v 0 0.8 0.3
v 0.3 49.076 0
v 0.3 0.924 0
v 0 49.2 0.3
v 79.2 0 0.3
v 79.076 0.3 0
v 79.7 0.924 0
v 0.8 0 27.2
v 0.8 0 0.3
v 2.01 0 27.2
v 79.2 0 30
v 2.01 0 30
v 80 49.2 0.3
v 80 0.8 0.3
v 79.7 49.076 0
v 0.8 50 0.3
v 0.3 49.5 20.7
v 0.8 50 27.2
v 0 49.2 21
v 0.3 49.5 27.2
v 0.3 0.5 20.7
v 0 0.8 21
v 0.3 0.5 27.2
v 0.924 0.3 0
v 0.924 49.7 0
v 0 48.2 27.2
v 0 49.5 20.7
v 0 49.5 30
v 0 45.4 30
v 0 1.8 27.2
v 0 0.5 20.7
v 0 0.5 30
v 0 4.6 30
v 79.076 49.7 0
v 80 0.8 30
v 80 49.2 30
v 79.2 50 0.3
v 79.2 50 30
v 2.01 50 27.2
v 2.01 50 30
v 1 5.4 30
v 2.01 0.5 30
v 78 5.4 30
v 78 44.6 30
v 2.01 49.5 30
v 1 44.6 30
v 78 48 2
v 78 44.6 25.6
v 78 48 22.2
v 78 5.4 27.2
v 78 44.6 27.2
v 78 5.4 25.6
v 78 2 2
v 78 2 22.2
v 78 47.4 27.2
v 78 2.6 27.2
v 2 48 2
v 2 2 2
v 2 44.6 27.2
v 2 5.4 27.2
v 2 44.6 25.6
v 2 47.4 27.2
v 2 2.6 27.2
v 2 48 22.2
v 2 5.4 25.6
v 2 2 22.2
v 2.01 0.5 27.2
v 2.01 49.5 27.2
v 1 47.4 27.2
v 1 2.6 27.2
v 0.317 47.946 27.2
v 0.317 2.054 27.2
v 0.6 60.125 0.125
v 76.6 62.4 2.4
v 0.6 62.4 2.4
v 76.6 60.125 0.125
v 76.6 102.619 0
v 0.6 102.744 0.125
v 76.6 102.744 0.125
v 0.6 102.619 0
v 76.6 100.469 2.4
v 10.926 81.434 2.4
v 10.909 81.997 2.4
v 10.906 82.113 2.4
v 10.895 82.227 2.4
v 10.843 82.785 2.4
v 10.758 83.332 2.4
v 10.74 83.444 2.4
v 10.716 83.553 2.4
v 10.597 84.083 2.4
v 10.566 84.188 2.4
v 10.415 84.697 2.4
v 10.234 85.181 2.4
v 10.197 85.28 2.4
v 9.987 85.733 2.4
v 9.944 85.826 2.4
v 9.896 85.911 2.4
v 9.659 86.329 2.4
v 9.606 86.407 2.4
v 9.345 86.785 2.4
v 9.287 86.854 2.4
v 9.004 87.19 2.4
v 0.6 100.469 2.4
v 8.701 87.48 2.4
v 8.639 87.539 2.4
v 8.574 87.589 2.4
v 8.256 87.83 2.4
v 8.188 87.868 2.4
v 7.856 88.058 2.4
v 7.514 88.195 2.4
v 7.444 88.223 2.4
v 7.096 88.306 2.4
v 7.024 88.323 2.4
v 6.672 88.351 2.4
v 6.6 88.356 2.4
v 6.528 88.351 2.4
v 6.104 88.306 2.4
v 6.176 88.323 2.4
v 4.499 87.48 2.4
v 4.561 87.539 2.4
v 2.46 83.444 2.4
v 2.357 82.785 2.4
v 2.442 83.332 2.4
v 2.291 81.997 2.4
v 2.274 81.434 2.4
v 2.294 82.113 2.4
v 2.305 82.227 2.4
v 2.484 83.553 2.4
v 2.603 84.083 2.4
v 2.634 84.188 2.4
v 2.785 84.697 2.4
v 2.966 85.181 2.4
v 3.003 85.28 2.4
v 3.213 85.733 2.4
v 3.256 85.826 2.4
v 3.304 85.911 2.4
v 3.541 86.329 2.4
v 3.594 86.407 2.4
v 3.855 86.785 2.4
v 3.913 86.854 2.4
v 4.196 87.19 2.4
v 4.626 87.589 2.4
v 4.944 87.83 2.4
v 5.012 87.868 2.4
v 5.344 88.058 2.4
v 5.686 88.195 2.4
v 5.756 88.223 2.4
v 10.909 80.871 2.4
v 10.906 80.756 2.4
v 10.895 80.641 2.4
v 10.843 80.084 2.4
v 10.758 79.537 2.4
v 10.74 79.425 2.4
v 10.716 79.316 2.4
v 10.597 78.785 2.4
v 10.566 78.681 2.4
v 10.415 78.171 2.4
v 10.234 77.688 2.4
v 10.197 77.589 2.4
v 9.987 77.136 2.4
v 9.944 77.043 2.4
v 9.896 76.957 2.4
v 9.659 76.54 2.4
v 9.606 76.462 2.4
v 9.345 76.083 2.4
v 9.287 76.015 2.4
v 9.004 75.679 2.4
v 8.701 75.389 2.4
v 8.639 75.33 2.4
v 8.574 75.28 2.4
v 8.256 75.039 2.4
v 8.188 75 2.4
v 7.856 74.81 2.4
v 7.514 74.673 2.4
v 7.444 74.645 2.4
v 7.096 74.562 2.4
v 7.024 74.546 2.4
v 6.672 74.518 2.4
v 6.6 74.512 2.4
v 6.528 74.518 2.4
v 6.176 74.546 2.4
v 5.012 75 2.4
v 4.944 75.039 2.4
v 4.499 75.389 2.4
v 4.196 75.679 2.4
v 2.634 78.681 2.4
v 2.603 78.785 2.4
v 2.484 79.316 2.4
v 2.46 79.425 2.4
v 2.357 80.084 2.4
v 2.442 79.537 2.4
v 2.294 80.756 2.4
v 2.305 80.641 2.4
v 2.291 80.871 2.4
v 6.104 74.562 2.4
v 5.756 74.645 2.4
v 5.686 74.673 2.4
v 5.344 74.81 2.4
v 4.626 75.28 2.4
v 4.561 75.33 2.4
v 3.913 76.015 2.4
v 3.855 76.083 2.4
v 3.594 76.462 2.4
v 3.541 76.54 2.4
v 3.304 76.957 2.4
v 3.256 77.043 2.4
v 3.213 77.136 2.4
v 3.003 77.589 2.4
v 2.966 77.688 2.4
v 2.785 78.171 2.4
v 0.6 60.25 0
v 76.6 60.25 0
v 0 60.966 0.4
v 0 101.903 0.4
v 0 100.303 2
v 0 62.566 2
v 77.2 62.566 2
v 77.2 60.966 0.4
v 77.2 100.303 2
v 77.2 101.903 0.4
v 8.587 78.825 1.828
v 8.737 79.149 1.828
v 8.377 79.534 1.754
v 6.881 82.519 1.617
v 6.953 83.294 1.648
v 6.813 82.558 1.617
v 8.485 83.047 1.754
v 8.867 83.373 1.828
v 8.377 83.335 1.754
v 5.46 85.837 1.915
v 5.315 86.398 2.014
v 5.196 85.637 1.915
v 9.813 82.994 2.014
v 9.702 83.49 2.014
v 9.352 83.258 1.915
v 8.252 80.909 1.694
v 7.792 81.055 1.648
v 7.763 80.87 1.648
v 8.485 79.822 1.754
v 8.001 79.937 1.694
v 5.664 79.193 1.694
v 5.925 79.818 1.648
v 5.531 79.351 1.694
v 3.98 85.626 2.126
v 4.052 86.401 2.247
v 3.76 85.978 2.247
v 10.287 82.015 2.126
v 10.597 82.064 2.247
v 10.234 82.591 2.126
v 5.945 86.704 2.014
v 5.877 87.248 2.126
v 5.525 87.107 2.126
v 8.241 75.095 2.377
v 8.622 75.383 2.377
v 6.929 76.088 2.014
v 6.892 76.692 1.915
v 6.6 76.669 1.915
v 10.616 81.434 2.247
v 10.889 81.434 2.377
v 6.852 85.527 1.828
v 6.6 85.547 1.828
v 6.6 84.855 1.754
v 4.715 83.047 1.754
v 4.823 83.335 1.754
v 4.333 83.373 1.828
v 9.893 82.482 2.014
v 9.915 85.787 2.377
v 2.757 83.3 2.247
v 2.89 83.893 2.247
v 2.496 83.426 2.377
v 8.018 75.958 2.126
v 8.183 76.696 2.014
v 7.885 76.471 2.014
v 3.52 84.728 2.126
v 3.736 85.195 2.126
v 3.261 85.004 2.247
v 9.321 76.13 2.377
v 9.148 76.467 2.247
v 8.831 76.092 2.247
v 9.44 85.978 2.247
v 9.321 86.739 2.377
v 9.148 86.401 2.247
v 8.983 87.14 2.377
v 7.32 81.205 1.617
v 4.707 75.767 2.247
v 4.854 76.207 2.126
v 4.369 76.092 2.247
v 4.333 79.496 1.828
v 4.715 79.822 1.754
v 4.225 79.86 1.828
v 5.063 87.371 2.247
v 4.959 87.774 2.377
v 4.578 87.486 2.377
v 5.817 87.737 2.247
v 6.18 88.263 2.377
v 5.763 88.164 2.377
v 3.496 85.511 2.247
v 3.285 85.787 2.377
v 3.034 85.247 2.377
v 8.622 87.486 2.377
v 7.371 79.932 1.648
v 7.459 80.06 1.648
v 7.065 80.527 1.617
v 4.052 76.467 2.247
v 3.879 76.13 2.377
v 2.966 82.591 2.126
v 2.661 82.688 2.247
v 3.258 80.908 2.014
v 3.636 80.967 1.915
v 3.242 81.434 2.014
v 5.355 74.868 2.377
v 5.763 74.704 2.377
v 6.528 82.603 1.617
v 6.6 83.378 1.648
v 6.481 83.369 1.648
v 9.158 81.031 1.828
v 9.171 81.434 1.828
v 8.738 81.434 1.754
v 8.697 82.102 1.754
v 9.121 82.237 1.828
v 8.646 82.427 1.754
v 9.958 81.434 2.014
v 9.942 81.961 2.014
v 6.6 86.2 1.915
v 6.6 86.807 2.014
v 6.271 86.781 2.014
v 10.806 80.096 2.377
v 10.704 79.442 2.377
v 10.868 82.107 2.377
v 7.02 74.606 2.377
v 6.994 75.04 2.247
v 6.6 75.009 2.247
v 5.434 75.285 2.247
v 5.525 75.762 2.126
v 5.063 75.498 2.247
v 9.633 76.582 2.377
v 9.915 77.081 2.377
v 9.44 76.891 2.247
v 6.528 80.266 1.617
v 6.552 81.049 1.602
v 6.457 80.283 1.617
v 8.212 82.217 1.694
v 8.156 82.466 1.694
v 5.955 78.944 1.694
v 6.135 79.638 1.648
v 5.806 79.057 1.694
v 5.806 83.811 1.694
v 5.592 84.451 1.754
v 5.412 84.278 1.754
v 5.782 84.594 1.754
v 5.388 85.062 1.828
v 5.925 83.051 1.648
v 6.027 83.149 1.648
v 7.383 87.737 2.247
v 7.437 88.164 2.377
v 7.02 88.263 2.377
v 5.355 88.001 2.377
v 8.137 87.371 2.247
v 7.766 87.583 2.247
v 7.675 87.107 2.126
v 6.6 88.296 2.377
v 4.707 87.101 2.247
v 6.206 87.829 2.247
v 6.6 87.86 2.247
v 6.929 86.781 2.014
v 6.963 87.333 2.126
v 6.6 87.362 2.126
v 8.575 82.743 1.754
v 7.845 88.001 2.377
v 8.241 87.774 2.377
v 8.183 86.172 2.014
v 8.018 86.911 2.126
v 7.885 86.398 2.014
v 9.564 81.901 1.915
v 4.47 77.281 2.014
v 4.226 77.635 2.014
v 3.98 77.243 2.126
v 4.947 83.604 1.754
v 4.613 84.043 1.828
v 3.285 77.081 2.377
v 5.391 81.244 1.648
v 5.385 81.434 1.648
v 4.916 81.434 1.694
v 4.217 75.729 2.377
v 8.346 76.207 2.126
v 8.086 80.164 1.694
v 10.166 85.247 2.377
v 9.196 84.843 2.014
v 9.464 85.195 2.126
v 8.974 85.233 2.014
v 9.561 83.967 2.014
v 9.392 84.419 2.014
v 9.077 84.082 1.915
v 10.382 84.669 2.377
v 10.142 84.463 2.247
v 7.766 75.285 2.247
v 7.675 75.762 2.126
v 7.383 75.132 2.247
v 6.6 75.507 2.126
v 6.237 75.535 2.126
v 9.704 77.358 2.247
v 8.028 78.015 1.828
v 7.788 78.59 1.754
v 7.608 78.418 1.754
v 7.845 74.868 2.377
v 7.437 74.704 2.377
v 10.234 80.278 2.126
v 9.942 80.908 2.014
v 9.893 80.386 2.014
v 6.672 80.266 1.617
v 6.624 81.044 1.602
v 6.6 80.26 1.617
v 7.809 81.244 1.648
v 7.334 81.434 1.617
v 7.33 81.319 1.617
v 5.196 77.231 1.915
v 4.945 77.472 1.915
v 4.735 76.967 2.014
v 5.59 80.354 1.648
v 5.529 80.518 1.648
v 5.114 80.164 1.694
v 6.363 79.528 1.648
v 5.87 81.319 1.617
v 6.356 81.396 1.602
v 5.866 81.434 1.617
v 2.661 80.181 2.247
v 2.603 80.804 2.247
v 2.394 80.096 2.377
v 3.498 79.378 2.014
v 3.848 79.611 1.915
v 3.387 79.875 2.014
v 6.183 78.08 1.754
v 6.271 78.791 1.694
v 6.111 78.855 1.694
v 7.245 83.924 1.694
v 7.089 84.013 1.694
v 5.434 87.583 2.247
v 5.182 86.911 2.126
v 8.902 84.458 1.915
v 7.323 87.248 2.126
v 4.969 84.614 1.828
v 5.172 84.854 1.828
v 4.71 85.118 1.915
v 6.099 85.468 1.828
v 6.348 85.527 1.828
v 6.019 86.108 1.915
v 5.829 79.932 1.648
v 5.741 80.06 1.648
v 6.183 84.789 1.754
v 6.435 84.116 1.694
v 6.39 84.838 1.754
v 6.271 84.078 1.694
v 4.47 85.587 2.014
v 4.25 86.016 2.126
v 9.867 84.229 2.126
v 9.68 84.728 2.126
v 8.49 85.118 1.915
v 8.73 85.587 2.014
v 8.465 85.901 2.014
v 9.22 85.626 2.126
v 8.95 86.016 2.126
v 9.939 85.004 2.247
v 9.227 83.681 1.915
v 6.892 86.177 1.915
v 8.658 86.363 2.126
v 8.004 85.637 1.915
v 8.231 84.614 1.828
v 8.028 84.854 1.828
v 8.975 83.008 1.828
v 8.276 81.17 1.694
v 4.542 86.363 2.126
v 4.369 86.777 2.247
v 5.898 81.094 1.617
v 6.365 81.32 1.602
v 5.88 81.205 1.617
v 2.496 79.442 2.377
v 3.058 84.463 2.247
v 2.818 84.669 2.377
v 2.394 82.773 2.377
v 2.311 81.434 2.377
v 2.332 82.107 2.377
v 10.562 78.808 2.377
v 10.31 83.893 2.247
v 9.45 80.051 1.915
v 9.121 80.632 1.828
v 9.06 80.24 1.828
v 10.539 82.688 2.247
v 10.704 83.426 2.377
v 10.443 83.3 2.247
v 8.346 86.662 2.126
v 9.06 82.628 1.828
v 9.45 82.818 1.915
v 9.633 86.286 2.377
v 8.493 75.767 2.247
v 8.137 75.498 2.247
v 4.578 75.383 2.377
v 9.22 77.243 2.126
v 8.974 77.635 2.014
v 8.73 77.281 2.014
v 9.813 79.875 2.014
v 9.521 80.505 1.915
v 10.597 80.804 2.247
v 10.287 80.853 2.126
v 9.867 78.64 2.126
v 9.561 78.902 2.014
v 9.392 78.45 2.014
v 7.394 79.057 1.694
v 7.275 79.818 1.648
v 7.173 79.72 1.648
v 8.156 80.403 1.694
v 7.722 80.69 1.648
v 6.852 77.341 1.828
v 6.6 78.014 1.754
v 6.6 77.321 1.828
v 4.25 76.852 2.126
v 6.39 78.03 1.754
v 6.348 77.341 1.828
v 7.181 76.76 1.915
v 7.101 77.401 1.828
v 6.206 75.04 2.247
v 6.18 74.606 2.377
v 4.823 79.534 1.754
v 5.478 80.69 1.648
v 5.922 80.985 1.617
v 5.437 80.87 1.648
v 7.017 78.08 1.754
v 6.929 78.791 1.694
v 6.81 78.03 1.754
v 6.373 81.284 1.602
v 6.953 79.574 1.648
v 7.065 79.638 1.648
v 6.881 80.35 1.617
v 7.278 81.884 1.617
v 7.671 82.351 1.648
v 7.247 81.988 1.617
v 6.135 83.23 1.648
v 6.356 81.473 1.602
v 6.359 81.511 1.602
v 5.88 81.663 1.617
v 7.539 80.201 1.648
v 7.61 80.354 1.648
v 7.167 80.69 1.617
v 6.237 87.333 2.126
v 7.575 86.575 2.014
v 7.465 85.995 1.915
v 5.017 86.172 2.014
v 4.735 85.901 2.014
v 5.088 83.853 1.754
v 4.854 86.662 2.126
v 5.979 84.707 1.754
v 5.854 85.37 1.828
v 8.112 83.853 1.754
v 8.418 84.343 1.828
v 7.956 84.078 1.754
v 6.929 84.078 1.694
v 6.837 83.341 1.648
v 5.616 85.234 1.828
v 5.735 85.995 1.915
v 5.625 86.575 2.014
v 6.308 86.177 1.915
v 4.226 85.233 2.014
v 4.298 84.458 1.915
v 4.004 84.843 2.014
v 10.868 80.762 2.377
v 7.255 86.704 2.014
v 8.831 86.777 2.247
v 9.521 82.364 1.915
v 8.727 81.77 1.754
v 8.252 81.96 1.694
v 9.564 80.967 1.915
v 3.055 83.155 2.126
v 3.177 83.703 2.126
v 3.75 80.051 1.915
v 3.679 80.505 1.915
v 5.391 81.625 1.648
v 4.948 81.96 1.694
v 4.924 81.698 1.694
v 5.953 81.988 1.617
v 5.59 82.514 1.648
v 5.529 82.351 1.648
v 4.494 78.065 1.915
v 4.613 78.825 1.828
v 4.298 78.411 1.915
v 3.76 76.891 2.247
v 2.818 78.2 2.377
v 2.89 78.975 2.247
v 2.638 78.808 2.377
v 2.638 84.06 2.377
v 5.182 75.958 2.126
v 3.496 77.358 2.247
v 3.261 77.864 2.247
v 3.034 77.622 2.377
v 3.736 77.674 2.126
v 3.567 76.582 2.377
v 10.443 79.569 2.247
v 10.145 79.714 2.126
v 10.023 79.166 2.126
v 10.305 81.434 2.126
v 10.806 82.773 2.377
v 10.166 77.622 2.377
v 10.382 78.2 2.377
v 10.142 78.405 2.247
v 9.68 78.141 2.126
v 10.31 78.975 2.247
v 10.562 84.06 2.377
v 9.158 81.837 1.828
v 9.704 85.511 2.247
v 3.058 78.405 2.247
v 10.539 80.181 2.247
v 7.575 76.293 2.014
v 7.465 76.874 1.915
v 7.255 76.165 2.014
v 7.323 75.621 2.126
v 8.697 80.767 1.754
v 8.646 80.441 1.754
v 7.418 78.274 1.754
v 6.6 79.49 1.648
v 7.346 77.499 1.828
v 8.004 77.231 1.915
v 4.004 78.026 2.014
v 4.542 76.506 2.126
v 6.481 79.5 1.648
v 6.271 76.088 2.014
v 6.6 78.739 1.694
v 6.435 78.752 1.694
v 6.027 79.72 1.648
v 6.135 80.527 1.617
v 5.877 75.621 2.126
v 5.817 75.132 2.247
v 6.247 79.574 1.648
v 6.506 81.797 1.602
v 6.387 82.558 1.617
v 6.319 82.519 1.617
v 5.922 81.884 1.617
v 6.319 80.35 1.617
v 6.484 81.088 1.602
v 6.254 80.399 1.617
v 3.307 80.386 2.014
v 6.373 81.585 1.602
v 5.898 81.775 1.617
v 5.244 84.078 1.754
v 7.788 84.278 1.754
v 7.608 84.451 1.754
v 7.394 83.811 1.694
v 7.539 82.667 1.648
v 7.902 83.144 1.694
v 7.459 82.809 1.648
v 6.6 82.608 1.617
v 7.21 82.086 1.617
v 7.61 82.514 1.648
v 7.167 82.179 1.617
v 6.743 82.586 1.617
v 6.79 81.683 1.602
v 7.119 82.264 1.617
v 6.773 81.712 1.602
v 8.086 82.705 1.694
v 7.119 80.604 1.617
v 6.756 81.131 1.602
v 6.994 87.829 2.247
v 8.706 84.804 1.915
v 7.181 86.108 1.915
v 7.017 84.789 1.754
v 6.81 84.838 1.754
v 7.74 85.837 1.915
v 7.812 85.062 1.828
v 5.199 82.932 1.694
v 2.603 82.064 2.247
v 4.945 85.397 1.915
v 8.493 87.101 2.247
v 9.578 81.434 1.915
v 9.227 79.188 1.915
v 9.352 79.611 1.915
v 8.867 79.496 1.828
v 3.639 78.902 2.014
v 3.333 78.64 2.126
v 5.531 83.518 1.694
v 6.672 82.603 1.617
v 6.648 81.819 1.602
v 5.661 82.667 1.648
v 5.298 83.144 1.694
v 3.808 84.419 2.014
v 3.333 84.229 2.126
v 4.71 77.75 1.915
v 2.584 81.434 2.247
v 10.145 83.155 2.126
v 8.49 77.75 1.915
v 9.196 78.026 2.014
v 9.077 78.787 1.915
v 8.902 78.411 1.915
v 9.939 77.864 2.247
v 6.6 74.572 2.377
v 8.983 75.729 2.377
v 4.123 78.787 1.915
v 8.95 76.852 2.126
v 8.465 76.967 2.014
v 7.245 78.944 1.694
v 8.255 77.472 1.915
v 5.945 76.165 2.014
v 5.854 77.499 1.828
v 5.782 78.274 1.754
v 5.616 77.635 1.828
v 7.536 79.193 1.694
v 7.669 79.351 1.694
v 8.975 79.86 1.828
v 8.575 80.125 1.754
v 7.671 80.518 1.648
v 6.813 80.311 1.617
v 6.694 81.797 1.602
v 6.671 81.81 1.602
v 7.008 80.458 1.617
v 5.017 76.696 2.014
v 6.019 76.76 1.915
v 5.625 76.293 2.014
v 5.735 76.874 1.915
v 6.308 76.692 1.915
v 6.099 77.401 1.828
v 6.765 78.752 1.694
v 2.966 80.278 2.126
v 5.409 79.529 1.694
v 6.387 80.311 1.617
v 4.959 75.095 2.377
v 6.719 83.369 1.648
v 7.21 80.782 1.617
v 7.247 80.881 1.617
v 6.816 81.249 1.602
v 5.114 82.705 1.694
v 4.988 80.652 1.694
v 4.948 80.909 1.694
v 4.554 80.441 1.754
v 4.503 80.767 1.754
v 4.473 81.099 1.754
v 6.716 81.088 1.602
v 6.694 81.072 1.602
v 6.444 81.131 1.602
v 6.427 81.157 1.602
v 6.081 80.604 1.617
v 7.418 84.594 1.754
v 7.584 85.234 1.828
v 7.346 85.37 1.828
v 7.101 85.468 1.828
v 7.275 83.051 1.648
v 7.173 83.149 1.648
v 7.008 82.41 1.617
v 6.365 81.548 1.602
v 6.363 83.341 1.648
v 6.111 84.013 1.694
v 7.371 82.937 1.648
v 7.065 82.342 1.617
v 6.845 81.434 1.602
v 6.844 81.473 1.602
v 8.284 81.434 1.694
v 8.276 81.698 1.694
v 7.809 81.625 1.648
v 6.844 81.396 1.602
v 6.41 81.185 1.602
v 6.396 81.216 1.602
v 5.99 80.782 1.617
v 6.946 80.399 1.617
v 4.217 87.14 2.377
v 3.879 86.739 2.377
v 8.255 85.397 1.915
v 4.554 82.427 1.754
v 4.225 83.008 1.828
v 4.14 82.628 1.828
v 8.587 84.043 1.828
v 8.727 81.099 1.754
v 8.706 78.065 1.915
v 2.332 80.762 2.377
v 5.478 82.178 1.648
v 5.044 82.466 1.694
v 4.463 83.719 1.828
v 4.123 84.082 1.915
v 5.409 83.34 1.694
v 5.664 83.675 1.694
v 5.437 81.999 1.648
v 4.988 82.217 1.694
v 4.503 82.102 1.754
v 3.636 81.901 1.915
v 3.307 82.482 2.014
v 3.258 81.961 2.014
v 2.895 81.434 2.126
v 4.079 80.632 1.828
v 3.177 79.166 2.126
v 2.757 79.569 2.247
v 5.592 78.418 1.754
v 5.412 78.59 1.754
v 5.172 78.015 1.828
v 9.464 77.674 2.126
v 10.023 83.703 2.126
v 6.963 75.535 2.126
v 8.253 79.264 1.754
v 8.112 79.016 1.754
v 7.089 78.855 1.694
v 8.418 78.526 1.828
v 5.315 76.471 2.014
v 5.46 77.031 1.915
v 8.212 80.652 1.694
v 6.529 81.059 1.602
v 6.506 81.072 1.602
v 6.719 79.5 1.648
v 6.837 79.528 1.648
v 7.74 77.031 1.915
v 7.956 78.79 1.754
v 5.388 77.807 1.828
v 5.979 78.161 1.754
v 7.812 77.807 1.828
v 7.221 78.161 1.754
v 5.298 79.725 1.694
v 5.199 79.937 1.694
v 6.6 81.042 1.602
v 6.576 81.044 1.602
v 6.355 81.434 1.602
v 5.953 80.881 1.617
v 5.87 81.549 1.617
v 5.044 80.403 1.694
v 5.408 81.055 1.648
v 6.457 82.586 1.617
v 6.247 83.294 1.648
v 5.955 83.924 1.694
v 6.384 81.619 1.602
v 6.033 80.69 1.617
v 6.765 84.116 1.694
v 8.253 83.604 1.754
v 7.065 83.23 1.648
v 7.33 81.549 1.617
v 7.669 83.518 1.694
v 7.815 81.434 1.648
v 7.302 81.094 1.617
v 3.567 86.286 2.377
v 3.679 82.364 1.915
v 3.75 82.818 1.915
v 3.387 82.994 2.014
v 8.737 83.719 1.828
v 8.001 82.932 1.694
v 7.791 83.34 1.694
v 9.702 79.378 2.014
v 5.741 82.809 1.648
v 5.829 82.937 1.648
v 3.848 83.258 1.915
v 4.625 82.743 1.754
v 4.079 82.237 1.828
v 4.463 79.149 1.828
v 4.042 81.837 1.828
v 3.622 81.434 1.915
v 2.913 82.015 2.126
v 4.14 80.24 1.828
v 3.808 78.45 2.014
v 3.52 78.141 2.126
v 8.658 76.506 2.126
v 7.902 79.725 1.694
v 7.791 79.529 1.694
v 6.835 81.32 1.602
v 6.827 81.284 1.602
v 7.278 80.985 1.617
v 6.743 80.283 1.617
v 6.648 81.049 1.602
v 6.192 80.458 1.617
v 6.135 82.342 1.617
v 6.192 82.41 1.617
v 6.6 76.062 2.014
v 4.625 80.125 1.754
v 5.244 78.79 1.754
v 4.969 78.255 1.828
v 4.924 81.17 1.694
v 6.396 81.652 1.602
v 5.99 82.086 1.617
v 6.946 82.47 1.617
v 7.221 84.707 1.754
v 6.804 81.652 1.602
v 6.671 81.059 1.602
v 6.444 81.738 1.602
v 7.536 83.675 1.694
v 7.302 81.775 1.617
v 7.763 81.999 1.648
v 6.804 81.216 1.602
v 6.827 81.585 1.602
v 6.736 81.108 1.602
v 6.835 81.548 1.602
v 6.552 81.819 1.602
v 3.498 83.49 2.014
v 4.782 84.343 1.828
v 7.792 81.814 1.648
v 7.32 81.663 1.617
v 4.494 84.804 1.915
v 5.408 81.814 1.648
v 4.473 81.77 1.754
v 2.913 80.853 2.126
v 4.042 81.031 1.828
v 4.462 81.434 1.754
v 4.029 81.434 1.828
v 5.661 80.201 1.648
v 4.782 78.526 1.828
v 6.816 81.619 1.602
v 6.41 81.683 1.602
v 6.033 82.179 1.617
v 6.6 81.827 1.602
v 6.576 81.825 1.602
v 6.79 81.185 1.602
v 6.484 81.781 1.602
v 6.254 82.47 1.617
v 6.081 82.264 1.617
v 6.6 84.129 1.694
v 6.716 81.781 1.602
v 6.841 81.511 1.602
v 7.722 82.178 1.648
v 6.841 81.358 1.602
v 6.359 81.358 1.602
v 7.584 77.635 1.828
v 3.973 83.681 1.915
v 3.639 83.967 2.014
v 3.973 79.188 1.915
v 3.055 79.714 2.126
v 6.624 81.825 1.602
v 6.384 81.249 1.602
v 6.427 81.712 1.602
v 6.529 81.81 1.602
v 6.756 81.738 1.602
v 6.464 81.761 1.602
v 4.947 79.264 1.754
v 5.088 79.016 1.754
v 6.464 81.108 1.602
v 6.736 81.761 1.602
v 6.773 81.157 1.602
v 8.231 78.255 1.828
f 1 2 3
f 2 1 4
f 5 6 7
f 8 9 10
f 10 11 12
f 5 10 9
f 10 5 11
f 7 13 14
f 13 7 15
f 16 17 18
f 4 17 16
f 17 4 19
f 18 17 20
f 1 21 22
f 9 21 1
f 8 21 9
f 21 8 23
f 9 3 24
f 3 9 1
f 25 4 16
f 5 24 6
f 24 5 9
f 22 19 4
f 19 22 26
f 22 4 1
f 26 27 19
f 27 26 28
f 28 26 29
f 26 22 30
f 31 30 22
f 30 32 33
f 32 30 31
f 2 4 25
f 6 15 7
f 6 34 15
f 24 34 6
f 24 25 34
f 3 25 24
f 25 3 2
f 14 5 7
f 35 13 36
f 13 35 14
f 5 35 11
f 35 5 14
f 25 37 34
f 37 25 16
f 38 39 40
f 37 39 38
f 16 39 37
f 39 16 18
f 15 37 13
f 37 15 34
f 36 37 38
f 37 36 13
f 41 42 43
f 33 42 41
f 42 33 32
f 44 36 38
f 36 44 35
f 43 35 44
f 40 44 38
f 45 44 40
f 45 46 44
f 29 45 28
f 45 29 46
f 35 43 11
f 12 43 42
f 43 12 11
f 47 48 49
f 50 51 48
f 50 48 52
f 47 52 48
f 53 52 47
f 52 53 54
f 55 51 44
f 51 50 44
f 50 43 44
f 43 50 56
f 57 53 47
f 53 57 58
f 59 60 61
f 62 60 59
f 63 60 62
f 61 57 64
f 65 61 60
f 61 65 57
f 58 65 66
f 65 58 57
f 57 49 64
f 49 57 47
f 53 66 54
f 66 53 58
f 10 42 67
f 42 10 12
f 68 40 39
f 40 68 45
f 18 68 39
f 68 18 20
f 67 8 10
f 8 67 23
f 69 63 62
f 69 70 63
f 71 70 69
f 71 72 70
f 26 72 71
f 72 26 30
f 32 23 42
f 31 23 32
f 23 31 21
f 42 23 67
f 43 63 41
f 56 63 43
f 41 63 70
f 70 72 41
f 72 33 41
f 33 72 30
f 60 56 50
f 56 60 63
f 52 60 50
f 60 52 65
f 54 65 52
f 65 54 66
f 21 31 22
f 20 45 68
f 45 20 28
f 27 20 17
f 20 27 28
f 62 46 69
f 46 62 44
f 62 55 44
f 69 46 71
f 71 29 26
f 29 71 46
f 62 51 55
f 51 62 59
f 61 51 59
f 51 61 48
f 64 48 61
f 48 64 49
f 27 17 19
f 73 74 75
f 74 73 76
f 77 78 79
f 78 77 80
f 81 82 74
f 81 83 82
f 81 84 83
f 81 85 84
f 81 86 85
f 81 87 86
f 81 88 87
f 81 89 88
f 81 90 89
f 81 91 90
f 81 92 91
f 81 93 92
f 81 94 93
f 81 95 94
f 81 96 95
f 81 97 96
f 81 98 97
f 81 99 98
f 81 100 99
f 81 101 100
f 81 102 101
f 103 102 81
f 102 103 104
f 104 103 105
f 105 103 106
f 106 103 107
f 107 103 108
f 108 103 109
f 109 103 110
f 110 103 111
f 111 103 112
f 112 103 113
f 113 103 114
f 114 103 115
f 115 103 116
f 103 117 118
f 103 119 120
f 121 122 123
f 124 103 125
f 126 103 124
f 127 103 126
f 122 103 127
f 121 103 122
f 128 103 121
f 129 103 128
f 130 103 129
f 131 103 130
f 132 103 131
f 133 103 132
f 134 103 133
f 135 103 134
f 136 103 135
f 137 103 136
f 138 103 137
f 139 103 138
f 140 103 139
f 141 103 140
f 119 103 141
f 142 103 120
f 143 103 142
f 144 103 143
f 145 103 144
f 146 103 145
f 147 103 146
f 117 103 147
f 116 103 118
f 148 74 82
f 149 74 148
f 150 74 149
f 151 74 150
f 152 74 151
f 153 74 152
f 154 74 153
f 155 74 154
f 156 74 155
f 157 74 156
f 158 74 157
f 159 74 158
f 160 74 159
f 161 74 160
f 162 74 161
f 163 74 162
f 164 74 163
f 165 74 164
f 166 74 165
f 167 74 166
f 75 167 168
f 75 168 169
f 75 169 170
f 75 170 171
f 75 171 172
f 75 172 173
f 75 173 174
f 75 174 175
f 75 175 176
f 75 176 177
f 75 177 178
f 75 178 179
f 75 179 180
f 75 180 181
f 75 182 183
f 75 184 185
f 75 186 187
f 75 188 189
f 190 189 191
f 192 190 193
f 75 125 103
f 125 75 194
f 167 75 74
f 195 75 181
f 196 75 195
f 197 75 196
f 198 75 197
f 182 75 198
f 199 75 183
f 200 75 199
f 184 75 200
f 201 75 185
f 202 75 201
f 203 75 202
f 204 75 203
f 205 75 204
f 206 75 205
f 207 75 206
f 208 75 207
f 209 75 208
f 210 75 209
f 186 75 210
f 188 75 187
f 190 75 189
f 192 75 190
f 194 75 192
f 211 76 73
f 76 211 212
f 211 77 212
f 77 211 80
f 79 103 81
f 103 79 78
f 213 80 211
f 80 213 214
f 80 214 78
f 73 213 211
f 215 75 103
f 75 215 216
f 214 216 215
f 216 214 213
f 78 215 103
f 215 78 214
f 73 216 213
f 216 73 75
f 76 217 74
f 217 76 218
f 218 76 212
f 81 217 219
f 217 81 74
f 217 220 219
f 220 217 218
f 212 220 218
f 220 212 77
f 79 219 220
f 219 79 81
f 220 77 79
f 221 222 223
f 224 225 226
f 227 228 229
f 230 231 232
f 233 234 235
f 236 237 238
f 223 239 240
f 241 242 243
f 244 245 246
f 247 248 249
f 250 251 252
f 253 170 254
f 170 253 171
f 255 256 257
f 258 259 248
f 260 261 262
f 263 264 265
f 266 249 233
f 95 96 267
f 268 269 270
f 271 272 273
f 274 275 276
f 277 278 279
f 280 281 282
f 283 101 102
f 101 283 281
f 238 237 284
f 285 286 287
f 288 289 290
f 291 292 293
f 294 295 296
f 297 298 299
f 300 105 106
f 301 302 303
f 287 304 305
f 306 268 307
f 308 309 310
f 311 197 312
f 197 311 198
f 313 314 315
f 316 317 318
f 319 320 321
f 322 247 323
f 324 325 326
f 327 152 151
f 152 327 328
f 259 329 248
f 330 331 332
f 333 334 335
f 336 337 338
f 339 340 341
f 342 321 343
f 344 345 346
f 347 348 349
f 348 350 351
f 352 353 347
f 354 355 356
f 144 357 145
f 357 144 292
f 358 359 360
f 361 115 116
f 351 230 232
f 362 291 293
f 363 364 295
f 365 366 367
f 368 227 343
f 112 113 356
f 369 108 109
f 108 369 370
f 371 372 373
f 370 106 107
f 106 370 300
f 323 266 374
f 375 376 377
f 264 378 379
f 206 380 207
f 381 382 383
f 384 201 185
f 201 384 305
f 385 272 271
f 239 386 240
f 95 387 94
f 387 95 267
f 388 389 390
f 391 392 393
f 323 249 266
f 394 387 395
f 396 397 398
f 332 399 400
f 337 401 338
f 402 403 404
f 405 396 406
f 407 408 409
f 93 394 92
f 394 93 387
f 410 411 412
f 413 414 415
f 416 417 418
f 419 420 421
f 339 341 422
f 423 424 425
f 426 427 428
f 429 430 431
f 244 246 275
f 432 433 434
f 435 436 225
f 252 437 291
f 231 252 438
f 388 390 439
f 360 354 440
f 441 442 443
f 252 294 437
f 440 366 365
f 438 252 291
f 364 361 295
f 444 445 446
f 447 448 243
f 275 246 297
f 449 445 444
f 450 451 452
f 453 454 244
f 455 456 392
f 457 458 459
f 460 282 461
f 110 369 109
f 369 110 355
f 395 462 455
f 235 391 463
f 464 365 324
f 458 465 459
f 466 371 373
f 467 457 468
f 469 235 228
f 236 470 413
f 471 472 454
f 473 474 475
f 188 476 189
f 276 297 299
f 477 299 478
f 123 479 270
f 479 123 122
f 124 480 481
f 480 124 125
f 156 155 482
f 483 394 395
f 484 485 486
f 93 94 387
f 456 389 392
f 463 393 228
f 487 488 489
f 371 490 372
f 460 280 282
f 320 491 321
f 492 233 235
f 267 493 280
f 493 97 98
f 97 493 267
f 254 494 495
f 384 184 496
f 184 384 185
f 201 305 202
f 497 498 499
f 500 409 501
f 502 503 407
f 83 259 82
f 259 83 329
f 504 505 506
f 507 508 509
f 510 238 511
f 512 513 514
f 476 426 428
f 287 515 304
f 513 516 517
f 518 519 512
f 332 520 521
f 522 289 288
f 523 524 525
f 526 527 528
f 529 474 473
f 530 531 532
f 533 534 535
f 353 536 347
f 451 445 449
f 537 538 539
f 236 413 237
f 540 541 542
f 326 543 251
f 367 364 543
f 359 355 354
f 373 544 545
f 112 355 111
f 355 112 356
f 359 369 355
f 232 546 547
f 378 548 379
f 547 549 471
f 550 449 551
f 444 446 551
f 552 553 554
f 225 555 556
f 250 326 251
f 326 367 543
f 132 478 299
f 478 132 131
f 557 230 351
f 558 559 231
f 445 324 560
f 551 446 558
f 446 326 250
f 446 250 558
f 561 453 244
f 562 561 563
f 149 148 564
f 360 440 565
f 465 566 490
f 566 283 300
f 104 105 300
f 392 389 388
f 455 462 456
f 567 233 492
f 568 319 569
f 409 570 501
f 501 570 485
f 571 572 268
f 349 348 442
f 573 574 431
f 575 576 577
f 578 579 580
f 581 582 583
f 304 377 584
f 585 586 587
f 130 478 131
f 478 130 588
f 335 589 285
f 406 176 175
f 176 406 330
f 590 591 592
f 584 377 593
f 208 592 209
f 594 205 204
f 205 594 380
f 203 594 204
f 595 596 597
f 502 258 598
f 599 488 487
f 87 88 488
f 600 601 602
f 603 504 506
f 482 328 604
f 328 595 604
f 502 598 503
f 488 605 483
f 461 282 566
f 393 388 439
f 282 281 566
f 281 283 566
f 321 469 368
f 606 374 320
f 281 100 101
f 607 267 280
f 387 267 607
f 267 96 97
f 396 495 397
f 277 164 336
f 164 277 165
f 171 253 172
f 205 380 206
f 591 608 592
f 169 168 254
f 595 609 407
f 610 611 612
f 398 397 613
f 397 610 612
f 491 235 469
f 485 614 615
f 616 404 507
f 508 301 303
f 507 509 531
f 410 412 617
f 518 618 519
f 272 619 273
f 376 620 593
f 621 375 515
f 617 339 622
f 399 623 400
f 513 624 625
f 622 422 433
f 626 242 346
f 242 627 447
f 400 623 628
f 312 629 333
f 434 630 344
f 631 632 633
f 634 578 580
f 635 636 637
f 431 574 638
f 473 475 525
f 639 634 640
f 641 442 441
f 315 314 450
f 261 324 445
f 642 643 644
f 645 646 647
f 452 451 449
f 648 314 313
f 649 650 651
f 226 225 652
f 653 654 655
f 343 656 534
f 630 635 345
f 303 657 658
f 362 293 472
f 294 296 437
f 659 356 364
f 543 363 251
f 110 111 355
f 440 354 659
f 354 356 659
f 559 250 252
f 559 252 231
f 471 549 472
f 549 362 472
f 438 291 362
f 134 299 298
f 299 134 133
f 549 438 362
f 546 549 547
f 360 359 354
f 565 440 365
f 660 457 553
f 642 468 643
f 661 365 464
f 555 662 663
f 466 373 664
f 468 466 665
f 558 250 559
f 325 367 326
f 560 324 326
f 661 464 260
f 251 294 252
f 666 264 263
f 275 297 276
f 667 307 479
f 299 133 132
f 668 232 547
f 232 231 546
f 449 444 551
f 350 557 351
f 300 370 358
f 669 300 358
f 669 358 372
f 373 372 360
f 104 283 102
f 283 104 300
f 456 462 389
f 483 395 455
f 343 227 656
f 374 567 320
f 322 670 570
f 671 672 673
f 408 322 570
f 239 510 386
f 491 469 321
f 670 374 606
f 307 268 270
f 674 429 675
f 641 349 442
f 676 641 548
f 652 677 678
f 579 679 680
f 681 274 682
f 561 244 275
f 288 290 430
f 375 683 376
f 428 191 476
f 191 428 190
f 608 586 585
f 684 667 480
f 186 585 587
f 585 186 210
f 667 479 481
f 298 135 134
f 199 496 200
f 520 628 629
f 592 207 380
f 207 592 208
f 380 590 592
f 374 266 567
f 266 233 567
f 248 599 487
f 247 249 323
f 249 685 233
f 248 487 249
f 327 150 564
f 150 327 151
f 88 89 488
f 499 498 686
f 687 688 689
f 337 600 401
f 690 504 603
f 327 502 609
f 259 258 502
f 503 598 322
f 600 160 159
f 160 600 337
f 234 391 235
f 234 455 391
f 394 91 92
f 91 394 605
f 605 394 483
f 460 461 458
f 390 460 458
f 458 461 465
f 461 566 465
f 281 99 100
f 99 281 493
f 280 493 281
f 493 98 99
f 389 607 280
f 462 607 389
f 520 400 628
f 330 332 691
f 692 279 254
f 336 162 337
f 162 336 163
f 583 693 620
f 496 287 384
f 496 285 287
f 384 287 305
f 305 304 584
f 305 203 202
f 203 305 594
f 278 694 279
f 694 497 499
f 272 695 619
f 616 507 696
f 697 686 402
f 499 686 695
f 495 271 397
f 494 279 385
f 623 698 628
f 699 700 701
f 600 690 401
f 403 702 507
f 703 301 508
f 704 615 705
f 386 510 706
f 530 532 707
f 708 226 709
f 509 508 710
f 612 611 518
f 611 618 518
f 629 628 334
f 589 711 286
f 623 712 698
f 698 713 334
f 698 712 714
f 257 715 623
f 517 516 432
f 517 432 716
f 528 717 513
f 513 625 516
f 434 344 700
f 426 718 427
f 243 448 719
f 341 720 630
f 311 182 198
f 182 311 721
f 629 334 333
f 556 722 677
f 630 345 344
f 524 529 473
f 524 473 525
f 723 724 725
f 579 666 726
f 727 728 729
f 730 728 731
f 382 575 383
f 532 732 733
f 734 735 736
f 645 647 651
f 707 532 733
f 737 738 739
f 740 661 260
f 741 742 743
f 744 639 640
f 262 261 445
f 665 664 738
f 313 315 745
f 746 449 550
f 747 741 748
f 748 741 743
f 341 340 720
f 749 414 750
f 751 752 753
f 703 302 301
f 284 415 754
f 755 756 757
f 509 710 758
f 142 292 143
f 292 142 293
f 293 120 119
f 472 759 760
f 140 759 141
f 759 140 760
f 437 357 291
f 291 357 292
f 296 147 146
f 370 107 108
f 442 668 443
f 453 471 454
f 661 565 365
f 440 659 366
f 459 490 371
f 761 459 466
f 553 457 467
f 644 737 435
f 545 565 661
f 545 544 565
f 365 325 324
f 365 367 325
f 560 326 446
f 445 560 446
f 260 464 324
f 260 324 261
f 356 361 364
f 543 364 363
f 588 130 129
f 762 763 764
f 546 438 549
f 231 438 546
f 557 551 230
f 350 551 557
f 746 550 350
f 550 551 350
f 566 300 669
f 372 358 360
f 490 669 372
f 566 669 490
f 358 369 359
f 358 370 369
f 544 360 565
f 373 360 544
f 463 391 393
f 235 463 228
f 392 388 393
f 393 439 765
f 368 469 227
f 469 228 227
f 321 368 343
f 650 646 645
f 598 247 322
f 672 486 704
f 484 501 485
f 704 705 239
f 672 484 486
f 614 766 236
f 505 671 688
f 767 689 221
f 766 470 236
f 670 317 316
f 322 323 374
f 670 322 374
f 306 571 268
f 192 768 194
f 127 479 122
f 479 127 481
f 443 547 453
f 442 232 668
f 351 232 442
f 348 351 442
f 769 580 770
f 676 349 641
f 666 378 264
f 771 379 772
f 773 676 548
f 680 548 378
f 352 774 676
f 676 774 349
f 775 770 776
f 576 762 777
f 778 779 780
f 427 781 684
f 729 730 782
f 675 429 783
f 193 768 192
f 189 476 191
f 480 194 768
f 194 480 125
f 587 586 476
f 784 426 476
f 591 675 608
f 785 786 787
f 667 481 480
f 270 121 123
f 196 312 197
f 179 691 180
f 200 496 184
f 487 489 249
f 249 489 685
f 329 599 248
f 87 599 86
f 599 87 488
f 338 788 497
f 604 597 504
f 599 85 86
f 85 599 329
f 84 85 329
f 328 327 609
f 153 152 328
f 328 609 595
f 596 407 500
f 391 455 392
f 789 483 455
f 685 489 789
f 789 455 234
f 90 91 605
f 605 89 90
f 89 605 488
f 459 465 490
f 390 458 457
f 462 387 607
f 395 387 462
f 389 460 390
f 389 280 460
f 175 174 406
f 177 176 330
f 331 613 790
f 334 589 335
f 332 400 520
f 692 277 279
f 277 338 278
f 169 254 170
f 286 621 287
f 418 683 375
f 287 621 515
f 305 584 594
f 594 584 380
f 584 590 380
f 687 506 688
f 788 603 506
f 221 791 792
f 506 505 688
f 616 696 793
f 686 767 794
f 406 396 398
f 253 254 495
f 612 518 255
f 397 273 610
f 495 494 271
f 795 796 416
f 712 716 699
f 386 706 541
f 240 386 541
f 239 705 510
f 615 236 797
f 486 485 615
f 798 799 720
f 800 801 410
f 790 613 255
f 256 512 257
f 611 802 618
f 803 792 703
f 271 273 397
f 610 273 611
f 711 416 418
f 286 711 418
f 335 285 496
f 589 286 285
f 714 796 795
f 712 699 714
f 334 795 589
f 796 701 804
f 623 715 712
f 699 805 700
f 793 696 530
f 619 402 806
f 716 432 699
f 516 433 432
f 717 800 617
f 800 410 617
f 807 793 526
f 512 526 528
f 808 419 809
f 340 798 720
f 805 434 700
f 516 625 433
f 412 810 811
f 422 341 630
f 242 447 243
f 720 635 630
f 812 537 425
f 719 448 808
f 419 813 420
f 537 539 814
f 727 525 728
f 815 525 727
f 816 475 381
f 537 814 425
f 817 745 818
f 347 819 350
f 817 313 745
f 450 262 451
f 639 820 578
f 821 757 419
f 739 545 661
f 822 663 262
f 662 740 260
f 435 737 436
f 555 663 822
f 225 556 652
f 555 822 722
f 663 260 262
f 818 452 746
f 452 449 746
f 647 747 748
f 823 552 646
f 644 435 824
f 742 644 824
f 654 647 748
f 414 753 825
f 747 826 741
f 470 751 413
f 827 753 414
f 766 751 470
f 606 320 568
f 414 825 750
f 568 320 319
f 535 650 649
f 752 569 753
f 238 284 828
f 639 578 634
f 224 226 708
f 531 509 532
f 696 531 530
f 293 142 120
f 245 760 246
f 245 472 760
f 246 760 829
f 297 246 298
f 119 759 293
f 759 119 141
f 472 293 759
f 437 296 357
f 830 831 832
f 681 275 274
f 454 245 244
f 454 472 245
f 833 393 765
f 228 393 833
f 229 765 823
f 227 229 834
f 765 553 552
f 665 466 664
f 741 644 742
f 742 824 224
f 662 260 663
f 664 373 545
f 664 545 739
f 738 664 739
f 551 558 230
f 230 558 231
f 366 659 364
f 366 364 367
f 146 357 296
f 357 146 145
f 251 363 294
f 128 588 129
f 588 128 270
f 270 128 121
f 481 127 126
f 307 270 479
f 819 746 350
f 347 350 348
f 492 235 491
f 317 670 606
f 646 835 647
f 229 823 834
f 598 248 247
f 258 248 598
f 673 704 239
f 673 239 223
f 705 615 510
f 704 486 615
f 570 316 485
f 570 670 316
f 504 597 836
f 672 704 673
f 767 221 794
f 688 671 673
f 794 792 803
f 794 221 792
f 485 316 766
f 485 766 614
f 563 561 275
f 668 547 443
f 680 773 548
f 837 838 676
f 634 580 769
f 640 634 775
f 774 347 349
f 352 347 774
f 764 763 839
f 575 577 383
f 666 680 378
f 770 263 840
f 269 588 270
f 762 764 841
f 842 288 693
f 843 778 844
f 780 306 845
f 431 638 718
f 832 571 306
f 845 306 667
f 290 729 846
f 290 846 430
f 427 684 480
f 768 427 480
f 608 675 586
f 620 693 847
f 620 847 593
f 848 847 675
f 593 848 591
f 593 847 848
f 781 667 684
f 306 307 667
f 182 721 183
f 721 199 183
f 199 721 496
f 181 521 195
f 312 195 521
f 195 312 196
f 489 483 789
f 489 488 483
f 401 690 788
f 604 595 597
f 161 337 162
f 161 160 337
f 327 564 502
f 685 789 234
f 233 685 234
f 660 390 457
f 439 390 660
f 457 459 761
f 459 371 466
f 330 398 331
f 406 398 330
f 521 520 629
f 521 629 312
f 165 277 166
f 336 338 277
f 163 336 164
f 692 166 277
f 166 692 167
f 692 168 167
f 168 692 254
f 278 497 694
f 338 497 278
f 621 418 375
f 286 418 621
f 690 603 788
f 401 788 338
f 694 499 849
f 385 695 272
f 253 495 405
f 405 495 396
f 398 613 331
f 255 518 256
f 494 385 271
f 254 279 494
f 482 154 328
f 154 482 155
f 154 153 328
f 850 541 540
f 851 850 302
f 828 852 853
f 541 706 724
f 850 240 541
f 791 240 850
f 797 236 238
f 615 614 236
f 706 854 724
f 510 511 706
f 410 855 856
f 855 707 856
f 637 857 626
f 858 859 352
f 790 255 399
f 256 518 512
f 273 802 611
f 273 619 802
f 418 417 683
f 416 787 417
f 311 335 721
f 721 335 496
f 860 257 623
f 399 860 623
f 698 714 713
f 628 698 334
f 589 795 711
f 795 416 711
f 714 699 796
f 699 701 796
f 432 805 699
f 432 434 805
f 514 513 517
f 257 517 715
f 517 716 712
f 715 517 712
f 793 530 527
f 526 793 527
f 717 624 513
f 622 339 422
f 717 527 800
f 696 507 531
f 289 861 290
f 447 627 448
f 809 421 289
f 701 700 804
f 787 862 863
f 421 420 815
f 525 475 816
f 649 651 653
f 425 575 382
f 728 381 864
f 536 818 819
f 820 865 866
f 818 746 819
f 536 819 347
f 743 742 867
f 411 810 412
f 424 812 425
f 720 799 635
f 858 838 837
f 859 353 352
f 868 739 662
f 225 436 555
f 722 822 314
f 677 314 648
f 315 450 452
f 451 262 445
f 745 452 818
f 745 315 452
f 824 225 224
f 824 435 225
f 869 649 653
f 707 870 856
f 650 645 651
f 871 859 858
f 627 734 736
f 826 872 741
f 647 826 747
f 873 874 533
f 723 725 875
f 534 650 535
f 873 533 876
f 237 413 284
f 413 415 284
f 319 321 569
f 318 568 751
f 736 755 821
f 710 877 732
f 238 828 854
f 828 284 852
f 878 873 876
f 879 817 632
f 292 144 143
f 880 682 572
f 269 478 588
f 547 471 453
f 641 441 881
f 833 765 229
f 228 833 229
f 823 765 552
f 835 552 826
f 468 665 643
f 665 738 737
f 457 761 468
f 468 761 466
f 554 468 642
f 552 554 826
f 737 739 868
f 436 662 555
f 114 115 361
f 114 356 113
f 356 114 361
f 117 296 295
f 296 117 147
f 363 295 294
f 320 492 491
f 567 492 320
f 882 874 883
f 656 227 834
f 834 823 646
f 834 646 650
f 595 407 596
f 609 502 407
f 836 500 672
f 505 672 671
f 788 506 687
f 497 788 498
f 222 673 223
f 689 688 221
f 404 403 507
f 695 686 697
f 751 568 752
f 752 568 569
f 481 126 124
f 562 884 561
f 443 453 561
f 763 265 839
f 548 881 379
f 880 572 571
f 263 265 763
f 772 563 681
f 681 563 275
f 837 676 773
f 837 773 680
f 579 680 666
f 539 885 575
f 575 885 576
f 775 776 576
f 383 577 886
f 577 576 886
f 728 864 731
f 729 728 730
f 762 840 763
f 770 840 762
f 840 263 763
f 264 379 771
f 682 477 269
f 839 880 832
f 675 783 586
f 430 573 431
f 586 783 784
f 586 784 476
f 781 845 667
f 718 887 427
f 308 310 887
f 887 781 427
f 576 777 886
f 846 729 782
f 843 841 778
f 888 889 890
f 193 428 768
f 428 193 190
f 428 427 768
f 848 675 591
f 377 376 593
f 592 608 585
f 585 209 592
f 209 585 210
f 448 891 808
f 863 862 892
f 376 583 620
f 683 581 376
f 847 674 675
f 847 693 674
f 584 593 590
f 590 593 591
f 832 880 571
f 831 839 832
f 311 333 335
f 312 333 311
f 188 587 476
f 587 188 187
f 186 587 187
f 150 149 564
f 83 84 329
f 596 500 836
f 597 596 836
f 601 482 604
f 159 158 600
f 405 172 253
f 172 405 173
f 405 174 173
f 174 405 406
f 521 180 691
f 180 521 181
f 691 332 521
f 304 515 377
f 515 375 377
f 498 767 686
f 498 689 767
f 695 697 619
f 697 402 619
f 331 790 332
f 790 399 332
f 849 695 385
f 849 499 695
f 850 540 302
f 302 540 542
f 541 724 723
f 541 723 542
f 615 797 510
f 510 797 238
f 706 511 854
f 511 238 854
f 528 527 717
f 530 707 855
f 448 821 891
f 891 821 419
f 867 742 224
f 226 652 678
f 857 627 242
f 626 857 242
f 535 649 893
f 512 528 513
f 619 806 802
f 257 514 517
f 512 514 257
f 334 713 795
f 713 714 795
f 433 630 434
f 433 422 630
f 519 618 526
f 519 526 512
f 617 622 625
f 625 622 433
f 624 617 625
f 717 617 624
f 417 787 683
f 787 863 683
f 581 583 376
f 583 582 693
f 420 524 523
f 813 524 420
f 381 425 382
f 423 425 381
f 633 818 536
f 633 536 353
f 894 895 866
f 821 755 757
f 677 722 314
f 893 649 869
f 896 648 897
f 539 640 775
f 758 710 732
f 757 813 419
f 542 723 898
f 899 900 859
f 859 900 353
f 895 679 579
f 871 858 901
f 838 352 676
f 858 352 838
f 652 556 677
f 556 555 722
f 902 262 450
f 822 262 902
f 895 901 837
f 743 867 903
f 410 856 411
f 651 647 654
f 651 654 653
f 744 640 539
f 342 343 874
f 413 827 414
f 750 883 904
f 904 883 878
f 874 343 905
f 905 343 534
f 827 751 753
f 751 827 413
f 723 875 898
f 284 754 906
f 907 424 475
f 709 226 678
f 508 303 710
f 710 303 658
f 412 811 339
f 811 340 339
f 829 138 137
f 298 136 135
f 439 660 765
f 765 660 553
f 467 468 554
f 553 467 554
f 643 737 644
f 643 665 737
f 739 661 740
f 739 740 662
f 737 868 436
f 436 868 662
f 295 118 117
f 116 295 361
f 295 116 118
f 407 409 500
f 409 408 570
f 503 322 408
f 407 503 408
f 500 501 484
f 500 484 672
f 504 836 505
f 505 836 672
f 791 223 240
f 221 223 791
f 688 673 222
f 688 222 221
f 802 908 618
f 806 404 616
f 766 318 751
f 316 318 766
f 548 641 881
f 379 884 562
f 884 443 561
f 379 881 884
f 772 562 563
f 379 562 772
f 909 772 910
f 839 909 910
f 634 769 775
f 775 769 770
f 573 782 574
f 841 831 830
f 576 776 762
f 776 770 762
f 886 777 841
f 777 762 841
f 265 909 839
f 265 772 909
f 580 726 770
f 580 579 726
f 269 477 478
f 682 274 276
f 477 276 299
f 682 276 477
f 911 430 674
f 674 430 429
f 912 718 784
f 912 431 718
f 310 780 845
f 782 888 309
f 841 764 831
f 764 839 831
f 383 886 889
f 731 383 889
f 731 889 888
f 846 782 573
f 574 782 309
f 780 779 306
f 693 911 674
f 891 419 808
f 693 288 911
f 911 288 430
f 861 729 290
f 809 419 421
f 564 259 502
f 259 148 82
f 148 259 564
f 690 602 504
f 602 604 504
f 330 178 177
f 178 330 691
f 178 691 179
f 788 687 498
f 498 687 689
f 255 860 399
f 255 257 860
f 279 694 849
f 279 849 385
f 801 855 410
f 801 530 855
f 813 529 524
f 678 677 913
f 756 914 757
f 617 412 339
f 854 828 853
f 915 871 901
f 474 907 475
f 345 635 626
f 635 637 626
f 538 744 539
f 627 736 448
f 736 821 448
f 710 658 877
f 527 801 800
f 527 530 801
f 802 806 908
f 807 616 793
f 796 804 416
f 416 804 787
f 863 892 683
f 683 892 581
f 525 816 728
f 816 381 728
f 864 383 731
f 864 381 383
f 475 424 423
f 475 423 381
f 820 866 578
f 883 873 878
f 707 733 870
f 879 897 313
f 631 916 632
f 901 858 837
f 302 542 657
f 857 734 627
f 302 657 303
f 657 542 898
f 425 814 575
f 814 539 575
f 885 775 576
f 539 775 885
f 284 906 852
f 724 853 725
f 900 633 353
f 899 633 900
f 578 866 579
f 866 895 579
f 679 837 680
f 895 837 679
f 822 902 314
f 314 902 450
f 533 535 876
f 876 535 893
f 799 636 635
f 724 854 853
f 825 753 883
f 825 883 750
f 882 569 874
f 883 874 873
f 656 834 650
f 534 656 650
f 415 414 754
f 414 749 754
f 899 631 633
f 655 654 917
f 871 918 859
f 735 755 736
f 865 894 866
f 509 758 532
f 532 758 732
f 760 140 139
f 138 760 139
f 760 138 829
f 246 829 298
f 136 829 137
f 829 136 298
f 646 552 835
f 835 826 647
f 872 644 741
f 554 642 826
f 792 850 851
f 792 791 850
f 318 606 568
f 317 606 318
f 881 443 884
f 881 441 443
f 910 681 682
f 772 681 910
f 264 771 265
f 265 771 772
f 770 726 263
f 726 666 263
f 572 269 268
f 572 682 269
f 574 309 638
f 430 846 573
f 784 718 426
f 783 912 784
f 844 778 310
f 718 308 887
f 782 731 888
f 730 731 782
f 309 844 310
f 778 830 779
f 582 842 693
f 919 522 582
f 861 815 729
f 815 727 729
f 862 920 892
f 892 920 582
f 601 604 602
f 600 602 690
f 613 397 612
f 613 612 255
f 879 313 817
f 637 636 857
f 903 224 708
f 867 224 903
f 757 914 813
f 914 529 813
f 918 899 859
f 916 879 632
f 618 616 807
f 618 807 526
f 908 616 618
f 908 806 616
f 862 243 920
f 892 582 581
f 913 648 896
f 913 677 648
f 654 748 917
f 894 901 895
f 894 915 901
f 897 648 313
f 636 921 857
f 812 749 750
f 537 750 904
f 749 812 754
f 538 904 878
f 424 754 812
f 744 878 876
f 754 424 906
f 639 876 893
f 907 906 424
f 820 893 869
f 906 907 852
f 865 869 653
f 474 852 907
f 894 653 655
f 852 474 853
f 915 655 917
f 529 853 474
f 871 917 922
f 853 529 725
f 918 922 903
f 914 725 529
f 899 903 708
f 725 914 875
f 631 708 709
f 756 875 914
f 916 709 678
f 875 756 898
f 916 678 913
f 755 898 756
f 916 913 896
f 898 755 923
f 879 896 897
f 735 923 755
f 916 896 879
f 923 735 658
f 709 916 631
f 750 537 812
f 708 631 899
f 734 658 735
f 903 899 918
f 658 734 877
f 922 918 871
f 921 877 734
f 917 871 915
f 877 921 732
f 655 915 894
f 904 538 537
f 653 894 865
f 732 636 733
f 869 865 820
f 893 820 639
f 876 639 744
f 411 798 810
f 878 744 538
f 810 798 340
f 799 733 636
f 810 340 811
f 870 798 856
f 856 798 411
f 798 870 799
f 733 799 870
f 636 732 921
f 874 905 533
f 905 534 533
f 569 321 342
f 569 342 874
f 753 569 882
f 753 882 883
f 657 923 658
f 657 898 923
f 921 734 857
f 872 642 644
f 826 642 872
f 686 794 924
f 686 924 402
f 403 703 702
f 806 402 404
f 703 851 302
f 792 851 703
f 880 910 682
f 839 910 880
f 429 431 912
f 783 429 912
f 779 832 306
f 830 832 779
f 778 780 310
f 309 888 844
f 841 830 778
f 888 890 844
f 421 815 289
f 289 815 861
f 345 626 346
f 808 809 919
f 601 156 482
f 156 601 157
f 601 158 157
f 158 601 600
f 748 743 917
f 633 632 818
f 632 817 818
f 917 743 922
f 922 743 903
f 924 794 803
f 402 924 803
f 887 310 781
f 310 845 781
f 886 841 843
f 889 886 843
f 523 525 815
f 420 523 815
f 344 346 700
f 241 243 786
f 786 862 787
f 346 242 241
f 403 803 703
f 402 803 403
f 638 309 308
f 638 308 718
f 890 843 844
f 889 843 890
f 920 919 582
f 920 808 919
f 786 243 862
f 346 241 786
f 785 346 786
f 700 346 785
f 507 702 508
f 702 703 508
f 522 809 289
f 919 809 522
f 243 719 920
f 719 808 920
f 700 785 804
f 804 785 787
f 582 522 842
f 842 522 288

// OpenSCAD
// Caja de 80 x 50 x 30 mm con tapa deslizante independiente.
// Unidades: mm. PLA, boquilla 0.4 mm. Imprimir tal como aparece.
$fn = 64;

largo = 80;
ancho = 50;
alto = 30;
pared = 2;
fondo = 2;
clearance = 0.4;             // Separacion normal entre superficies
chaflan_entrada = 0.4;
longitud_entrada = 0.6;

z_tapa = 27.6;
espesor_tapa = alto-z_tapa;
z_apoyo = z_tapa-clearance;
plano_guia = 24.6;          // Cara inclinada: z-y = plano_guia
saliente_guia = alto-plano_guia;
borde_tapa = z_tapa-plano_guia+clearance*sqrt(2);
x_inicio = clearance;
x_fin = largo-pared-clearance;
lamina = 0.02;

// Prisma con coordenadas de seccion [y,z], extruido sobre X.
module prisma_x(puntos, x, longitud) {
    translate([x,0,0])
        rotate([90,0,90])
            linear_extrude(height=longitud, convexity=10)
                polygon(points=puntos);
}

module contorno_exterior() {
    polygon([
        [0.8,0],[largo-0.8,0],
        [largo,0.8],[largo,ancho-0.8],
        [largo-0.8,ancho],[0.8,ancho],
        [0,ancho-0.8],[0,0.8]
    ]);
}

module envolvente() {
    union() {
        // Alivio inferior contra pie de elefante.
        hull() {
            linear_extrude(height=lamina)
                offset(delta=-0.3) contorno_exterior();
            translate([0,0,0.3])
                linear_extrude(height=lamina)
                    contorno_exterior();
        }
        translate([0,0,0.3])
            linear_extrude(height=alto-0.3)
                contorno_exterior();
    }
}

module carcasa() {
    difference() {
        envolvente();
        // Cavidad: paredes y fondo nominales de 2 mm.
        translate([pared,pared,fondo])
            cube([largo-2*pared,ancho-2*pared,alto]);
        // Boca frontal de insercion, abierta hasta las guias.
        translate([-1,-1,z_apoyo])
            cube([pared+1.01,ancho+2,alto-z_apoyo+1]);
    }
}

// La rampa inferior crece a 45 grados y sostiene la tapa.
// La cara inferior de la guia superior tambien esta a 45 grados.
perfil_superior = [
    [0.5,plano_guia+0.5],
    [saliente_guia,alto],
    [0.5,alto]
];
perfil_superior_entrada = [
    [0.5,plano_guia+1.3],
    [saliente_guia-0.8,alto],
    [0.5,alto]
];
perfil_inferior = [
    [0.5,z_apoyo-1.6-(saliente_guia-0.5)],
    [saliente_guia,z_apoyo-1.6],
    [saliente_guia,z_apoyo],
    [0.5,z_apoyo]
];
perfil_inferior_entrada = [
    [0.5,z_apoyo-1.6-(saliente_guia-0.5)],
    [saliente_guia-0.8,z_apoyo-2.4],
    [saliente_guia-0.8,z_apoyo-0.8],
    [0.5,z_apoyo-0.8]
];

module guia_con_entrada(perfil, entrada) {
    union() {
        prisma_x(perfil,1,largo-pared-1);
        hull() {
            prisma_x(entrada,0,lamina);
            prisma_x(perfil,1,lamina);
        }
    }
}

module guias_laterales() {
    for (lado=[0,1]) {
        if (lado==0) {
            guia_con_entrada(perfil_superior,perfil_superior_entrada);
            guia_con_entrada(perfil_inferior,perfil_inferior_entrada);
        } else {
            translate([0,ancho,0]) mirror([0,1,0]) {
                guia_con_entrada(perfil_superior,perfil_superior_entrada);
                guia_con_entrada(perfil_inferior,perfil_inferior_entrada);
            }
        }
    }
}

module caja() {
    union() {
        carcasa();
        guias_laterales();
    }
}

// Cola de milano: la base de la tapa es mas ancha que su cara superior.
// El desplazamiento sqrt(2)*clearance mantiene 0.4 mm NORMALES
// respecto de cada plano de guia a 45 grados.
module seccion_tapa() {
    l = borde_tapa;
    r = ancho-borde_tapa;
    e = 0.25;
    polygon([
        [l+e,z_tapa],
        [r-e,z_tapa],
        [r-e/2,z_tapa+e/2],
        [r-espesor_tapa,alto],
        [l+espesor_tapa,alto],
        [l+e/2,z_tapa+e/2]
    ]);
}

module tramo_tapa(x, longitud, retranqueo=0) {
    translate([x,0,0]) rotate([90,0,90])
        linear_extrude(height=longitud,convexity=10)
            offset(delta=-retranqueo,chamfer=true)
                seccion_tapa();
}

module tapa() {
    difference() {
        union() {
            tramo_tapa(x_inicio+longitud_entrada,
                       x_fin-x_inicio-2*longitud_entrada);
            // Chaflan perimetral en ambos extremos de deslizamiento.
            hull() {
                tramo_tapa(x_inicio,lamina,chaflan_entrada);
                tramo_tapa(x_inicio+longitud_entrada,lamina);
            }
            hull() {
                tramo_tapa(x_fin-longitud_entrada-lamina,lamina);
                tramo_tapa(x_fin-lamina,lamina,chaflan_entrada);
            }
        }
        // Uñero superior rebajado: profundidad 0.8, fondo restante 1.6.
        translate([7,ancho/2,alto+0.8])
            scale([5,8,1.6]) sphere(r=1);
    }
}

// Exactamente dos cuerpos, ambos con cara plana sobre z=0.
// Caja: 80 x 50 x 30. Separacion de impresion entre cuerpos: 10 mm.
caja();
translate([-x_inicio,60-borde_tapa,-z_tapa]) tapa();
